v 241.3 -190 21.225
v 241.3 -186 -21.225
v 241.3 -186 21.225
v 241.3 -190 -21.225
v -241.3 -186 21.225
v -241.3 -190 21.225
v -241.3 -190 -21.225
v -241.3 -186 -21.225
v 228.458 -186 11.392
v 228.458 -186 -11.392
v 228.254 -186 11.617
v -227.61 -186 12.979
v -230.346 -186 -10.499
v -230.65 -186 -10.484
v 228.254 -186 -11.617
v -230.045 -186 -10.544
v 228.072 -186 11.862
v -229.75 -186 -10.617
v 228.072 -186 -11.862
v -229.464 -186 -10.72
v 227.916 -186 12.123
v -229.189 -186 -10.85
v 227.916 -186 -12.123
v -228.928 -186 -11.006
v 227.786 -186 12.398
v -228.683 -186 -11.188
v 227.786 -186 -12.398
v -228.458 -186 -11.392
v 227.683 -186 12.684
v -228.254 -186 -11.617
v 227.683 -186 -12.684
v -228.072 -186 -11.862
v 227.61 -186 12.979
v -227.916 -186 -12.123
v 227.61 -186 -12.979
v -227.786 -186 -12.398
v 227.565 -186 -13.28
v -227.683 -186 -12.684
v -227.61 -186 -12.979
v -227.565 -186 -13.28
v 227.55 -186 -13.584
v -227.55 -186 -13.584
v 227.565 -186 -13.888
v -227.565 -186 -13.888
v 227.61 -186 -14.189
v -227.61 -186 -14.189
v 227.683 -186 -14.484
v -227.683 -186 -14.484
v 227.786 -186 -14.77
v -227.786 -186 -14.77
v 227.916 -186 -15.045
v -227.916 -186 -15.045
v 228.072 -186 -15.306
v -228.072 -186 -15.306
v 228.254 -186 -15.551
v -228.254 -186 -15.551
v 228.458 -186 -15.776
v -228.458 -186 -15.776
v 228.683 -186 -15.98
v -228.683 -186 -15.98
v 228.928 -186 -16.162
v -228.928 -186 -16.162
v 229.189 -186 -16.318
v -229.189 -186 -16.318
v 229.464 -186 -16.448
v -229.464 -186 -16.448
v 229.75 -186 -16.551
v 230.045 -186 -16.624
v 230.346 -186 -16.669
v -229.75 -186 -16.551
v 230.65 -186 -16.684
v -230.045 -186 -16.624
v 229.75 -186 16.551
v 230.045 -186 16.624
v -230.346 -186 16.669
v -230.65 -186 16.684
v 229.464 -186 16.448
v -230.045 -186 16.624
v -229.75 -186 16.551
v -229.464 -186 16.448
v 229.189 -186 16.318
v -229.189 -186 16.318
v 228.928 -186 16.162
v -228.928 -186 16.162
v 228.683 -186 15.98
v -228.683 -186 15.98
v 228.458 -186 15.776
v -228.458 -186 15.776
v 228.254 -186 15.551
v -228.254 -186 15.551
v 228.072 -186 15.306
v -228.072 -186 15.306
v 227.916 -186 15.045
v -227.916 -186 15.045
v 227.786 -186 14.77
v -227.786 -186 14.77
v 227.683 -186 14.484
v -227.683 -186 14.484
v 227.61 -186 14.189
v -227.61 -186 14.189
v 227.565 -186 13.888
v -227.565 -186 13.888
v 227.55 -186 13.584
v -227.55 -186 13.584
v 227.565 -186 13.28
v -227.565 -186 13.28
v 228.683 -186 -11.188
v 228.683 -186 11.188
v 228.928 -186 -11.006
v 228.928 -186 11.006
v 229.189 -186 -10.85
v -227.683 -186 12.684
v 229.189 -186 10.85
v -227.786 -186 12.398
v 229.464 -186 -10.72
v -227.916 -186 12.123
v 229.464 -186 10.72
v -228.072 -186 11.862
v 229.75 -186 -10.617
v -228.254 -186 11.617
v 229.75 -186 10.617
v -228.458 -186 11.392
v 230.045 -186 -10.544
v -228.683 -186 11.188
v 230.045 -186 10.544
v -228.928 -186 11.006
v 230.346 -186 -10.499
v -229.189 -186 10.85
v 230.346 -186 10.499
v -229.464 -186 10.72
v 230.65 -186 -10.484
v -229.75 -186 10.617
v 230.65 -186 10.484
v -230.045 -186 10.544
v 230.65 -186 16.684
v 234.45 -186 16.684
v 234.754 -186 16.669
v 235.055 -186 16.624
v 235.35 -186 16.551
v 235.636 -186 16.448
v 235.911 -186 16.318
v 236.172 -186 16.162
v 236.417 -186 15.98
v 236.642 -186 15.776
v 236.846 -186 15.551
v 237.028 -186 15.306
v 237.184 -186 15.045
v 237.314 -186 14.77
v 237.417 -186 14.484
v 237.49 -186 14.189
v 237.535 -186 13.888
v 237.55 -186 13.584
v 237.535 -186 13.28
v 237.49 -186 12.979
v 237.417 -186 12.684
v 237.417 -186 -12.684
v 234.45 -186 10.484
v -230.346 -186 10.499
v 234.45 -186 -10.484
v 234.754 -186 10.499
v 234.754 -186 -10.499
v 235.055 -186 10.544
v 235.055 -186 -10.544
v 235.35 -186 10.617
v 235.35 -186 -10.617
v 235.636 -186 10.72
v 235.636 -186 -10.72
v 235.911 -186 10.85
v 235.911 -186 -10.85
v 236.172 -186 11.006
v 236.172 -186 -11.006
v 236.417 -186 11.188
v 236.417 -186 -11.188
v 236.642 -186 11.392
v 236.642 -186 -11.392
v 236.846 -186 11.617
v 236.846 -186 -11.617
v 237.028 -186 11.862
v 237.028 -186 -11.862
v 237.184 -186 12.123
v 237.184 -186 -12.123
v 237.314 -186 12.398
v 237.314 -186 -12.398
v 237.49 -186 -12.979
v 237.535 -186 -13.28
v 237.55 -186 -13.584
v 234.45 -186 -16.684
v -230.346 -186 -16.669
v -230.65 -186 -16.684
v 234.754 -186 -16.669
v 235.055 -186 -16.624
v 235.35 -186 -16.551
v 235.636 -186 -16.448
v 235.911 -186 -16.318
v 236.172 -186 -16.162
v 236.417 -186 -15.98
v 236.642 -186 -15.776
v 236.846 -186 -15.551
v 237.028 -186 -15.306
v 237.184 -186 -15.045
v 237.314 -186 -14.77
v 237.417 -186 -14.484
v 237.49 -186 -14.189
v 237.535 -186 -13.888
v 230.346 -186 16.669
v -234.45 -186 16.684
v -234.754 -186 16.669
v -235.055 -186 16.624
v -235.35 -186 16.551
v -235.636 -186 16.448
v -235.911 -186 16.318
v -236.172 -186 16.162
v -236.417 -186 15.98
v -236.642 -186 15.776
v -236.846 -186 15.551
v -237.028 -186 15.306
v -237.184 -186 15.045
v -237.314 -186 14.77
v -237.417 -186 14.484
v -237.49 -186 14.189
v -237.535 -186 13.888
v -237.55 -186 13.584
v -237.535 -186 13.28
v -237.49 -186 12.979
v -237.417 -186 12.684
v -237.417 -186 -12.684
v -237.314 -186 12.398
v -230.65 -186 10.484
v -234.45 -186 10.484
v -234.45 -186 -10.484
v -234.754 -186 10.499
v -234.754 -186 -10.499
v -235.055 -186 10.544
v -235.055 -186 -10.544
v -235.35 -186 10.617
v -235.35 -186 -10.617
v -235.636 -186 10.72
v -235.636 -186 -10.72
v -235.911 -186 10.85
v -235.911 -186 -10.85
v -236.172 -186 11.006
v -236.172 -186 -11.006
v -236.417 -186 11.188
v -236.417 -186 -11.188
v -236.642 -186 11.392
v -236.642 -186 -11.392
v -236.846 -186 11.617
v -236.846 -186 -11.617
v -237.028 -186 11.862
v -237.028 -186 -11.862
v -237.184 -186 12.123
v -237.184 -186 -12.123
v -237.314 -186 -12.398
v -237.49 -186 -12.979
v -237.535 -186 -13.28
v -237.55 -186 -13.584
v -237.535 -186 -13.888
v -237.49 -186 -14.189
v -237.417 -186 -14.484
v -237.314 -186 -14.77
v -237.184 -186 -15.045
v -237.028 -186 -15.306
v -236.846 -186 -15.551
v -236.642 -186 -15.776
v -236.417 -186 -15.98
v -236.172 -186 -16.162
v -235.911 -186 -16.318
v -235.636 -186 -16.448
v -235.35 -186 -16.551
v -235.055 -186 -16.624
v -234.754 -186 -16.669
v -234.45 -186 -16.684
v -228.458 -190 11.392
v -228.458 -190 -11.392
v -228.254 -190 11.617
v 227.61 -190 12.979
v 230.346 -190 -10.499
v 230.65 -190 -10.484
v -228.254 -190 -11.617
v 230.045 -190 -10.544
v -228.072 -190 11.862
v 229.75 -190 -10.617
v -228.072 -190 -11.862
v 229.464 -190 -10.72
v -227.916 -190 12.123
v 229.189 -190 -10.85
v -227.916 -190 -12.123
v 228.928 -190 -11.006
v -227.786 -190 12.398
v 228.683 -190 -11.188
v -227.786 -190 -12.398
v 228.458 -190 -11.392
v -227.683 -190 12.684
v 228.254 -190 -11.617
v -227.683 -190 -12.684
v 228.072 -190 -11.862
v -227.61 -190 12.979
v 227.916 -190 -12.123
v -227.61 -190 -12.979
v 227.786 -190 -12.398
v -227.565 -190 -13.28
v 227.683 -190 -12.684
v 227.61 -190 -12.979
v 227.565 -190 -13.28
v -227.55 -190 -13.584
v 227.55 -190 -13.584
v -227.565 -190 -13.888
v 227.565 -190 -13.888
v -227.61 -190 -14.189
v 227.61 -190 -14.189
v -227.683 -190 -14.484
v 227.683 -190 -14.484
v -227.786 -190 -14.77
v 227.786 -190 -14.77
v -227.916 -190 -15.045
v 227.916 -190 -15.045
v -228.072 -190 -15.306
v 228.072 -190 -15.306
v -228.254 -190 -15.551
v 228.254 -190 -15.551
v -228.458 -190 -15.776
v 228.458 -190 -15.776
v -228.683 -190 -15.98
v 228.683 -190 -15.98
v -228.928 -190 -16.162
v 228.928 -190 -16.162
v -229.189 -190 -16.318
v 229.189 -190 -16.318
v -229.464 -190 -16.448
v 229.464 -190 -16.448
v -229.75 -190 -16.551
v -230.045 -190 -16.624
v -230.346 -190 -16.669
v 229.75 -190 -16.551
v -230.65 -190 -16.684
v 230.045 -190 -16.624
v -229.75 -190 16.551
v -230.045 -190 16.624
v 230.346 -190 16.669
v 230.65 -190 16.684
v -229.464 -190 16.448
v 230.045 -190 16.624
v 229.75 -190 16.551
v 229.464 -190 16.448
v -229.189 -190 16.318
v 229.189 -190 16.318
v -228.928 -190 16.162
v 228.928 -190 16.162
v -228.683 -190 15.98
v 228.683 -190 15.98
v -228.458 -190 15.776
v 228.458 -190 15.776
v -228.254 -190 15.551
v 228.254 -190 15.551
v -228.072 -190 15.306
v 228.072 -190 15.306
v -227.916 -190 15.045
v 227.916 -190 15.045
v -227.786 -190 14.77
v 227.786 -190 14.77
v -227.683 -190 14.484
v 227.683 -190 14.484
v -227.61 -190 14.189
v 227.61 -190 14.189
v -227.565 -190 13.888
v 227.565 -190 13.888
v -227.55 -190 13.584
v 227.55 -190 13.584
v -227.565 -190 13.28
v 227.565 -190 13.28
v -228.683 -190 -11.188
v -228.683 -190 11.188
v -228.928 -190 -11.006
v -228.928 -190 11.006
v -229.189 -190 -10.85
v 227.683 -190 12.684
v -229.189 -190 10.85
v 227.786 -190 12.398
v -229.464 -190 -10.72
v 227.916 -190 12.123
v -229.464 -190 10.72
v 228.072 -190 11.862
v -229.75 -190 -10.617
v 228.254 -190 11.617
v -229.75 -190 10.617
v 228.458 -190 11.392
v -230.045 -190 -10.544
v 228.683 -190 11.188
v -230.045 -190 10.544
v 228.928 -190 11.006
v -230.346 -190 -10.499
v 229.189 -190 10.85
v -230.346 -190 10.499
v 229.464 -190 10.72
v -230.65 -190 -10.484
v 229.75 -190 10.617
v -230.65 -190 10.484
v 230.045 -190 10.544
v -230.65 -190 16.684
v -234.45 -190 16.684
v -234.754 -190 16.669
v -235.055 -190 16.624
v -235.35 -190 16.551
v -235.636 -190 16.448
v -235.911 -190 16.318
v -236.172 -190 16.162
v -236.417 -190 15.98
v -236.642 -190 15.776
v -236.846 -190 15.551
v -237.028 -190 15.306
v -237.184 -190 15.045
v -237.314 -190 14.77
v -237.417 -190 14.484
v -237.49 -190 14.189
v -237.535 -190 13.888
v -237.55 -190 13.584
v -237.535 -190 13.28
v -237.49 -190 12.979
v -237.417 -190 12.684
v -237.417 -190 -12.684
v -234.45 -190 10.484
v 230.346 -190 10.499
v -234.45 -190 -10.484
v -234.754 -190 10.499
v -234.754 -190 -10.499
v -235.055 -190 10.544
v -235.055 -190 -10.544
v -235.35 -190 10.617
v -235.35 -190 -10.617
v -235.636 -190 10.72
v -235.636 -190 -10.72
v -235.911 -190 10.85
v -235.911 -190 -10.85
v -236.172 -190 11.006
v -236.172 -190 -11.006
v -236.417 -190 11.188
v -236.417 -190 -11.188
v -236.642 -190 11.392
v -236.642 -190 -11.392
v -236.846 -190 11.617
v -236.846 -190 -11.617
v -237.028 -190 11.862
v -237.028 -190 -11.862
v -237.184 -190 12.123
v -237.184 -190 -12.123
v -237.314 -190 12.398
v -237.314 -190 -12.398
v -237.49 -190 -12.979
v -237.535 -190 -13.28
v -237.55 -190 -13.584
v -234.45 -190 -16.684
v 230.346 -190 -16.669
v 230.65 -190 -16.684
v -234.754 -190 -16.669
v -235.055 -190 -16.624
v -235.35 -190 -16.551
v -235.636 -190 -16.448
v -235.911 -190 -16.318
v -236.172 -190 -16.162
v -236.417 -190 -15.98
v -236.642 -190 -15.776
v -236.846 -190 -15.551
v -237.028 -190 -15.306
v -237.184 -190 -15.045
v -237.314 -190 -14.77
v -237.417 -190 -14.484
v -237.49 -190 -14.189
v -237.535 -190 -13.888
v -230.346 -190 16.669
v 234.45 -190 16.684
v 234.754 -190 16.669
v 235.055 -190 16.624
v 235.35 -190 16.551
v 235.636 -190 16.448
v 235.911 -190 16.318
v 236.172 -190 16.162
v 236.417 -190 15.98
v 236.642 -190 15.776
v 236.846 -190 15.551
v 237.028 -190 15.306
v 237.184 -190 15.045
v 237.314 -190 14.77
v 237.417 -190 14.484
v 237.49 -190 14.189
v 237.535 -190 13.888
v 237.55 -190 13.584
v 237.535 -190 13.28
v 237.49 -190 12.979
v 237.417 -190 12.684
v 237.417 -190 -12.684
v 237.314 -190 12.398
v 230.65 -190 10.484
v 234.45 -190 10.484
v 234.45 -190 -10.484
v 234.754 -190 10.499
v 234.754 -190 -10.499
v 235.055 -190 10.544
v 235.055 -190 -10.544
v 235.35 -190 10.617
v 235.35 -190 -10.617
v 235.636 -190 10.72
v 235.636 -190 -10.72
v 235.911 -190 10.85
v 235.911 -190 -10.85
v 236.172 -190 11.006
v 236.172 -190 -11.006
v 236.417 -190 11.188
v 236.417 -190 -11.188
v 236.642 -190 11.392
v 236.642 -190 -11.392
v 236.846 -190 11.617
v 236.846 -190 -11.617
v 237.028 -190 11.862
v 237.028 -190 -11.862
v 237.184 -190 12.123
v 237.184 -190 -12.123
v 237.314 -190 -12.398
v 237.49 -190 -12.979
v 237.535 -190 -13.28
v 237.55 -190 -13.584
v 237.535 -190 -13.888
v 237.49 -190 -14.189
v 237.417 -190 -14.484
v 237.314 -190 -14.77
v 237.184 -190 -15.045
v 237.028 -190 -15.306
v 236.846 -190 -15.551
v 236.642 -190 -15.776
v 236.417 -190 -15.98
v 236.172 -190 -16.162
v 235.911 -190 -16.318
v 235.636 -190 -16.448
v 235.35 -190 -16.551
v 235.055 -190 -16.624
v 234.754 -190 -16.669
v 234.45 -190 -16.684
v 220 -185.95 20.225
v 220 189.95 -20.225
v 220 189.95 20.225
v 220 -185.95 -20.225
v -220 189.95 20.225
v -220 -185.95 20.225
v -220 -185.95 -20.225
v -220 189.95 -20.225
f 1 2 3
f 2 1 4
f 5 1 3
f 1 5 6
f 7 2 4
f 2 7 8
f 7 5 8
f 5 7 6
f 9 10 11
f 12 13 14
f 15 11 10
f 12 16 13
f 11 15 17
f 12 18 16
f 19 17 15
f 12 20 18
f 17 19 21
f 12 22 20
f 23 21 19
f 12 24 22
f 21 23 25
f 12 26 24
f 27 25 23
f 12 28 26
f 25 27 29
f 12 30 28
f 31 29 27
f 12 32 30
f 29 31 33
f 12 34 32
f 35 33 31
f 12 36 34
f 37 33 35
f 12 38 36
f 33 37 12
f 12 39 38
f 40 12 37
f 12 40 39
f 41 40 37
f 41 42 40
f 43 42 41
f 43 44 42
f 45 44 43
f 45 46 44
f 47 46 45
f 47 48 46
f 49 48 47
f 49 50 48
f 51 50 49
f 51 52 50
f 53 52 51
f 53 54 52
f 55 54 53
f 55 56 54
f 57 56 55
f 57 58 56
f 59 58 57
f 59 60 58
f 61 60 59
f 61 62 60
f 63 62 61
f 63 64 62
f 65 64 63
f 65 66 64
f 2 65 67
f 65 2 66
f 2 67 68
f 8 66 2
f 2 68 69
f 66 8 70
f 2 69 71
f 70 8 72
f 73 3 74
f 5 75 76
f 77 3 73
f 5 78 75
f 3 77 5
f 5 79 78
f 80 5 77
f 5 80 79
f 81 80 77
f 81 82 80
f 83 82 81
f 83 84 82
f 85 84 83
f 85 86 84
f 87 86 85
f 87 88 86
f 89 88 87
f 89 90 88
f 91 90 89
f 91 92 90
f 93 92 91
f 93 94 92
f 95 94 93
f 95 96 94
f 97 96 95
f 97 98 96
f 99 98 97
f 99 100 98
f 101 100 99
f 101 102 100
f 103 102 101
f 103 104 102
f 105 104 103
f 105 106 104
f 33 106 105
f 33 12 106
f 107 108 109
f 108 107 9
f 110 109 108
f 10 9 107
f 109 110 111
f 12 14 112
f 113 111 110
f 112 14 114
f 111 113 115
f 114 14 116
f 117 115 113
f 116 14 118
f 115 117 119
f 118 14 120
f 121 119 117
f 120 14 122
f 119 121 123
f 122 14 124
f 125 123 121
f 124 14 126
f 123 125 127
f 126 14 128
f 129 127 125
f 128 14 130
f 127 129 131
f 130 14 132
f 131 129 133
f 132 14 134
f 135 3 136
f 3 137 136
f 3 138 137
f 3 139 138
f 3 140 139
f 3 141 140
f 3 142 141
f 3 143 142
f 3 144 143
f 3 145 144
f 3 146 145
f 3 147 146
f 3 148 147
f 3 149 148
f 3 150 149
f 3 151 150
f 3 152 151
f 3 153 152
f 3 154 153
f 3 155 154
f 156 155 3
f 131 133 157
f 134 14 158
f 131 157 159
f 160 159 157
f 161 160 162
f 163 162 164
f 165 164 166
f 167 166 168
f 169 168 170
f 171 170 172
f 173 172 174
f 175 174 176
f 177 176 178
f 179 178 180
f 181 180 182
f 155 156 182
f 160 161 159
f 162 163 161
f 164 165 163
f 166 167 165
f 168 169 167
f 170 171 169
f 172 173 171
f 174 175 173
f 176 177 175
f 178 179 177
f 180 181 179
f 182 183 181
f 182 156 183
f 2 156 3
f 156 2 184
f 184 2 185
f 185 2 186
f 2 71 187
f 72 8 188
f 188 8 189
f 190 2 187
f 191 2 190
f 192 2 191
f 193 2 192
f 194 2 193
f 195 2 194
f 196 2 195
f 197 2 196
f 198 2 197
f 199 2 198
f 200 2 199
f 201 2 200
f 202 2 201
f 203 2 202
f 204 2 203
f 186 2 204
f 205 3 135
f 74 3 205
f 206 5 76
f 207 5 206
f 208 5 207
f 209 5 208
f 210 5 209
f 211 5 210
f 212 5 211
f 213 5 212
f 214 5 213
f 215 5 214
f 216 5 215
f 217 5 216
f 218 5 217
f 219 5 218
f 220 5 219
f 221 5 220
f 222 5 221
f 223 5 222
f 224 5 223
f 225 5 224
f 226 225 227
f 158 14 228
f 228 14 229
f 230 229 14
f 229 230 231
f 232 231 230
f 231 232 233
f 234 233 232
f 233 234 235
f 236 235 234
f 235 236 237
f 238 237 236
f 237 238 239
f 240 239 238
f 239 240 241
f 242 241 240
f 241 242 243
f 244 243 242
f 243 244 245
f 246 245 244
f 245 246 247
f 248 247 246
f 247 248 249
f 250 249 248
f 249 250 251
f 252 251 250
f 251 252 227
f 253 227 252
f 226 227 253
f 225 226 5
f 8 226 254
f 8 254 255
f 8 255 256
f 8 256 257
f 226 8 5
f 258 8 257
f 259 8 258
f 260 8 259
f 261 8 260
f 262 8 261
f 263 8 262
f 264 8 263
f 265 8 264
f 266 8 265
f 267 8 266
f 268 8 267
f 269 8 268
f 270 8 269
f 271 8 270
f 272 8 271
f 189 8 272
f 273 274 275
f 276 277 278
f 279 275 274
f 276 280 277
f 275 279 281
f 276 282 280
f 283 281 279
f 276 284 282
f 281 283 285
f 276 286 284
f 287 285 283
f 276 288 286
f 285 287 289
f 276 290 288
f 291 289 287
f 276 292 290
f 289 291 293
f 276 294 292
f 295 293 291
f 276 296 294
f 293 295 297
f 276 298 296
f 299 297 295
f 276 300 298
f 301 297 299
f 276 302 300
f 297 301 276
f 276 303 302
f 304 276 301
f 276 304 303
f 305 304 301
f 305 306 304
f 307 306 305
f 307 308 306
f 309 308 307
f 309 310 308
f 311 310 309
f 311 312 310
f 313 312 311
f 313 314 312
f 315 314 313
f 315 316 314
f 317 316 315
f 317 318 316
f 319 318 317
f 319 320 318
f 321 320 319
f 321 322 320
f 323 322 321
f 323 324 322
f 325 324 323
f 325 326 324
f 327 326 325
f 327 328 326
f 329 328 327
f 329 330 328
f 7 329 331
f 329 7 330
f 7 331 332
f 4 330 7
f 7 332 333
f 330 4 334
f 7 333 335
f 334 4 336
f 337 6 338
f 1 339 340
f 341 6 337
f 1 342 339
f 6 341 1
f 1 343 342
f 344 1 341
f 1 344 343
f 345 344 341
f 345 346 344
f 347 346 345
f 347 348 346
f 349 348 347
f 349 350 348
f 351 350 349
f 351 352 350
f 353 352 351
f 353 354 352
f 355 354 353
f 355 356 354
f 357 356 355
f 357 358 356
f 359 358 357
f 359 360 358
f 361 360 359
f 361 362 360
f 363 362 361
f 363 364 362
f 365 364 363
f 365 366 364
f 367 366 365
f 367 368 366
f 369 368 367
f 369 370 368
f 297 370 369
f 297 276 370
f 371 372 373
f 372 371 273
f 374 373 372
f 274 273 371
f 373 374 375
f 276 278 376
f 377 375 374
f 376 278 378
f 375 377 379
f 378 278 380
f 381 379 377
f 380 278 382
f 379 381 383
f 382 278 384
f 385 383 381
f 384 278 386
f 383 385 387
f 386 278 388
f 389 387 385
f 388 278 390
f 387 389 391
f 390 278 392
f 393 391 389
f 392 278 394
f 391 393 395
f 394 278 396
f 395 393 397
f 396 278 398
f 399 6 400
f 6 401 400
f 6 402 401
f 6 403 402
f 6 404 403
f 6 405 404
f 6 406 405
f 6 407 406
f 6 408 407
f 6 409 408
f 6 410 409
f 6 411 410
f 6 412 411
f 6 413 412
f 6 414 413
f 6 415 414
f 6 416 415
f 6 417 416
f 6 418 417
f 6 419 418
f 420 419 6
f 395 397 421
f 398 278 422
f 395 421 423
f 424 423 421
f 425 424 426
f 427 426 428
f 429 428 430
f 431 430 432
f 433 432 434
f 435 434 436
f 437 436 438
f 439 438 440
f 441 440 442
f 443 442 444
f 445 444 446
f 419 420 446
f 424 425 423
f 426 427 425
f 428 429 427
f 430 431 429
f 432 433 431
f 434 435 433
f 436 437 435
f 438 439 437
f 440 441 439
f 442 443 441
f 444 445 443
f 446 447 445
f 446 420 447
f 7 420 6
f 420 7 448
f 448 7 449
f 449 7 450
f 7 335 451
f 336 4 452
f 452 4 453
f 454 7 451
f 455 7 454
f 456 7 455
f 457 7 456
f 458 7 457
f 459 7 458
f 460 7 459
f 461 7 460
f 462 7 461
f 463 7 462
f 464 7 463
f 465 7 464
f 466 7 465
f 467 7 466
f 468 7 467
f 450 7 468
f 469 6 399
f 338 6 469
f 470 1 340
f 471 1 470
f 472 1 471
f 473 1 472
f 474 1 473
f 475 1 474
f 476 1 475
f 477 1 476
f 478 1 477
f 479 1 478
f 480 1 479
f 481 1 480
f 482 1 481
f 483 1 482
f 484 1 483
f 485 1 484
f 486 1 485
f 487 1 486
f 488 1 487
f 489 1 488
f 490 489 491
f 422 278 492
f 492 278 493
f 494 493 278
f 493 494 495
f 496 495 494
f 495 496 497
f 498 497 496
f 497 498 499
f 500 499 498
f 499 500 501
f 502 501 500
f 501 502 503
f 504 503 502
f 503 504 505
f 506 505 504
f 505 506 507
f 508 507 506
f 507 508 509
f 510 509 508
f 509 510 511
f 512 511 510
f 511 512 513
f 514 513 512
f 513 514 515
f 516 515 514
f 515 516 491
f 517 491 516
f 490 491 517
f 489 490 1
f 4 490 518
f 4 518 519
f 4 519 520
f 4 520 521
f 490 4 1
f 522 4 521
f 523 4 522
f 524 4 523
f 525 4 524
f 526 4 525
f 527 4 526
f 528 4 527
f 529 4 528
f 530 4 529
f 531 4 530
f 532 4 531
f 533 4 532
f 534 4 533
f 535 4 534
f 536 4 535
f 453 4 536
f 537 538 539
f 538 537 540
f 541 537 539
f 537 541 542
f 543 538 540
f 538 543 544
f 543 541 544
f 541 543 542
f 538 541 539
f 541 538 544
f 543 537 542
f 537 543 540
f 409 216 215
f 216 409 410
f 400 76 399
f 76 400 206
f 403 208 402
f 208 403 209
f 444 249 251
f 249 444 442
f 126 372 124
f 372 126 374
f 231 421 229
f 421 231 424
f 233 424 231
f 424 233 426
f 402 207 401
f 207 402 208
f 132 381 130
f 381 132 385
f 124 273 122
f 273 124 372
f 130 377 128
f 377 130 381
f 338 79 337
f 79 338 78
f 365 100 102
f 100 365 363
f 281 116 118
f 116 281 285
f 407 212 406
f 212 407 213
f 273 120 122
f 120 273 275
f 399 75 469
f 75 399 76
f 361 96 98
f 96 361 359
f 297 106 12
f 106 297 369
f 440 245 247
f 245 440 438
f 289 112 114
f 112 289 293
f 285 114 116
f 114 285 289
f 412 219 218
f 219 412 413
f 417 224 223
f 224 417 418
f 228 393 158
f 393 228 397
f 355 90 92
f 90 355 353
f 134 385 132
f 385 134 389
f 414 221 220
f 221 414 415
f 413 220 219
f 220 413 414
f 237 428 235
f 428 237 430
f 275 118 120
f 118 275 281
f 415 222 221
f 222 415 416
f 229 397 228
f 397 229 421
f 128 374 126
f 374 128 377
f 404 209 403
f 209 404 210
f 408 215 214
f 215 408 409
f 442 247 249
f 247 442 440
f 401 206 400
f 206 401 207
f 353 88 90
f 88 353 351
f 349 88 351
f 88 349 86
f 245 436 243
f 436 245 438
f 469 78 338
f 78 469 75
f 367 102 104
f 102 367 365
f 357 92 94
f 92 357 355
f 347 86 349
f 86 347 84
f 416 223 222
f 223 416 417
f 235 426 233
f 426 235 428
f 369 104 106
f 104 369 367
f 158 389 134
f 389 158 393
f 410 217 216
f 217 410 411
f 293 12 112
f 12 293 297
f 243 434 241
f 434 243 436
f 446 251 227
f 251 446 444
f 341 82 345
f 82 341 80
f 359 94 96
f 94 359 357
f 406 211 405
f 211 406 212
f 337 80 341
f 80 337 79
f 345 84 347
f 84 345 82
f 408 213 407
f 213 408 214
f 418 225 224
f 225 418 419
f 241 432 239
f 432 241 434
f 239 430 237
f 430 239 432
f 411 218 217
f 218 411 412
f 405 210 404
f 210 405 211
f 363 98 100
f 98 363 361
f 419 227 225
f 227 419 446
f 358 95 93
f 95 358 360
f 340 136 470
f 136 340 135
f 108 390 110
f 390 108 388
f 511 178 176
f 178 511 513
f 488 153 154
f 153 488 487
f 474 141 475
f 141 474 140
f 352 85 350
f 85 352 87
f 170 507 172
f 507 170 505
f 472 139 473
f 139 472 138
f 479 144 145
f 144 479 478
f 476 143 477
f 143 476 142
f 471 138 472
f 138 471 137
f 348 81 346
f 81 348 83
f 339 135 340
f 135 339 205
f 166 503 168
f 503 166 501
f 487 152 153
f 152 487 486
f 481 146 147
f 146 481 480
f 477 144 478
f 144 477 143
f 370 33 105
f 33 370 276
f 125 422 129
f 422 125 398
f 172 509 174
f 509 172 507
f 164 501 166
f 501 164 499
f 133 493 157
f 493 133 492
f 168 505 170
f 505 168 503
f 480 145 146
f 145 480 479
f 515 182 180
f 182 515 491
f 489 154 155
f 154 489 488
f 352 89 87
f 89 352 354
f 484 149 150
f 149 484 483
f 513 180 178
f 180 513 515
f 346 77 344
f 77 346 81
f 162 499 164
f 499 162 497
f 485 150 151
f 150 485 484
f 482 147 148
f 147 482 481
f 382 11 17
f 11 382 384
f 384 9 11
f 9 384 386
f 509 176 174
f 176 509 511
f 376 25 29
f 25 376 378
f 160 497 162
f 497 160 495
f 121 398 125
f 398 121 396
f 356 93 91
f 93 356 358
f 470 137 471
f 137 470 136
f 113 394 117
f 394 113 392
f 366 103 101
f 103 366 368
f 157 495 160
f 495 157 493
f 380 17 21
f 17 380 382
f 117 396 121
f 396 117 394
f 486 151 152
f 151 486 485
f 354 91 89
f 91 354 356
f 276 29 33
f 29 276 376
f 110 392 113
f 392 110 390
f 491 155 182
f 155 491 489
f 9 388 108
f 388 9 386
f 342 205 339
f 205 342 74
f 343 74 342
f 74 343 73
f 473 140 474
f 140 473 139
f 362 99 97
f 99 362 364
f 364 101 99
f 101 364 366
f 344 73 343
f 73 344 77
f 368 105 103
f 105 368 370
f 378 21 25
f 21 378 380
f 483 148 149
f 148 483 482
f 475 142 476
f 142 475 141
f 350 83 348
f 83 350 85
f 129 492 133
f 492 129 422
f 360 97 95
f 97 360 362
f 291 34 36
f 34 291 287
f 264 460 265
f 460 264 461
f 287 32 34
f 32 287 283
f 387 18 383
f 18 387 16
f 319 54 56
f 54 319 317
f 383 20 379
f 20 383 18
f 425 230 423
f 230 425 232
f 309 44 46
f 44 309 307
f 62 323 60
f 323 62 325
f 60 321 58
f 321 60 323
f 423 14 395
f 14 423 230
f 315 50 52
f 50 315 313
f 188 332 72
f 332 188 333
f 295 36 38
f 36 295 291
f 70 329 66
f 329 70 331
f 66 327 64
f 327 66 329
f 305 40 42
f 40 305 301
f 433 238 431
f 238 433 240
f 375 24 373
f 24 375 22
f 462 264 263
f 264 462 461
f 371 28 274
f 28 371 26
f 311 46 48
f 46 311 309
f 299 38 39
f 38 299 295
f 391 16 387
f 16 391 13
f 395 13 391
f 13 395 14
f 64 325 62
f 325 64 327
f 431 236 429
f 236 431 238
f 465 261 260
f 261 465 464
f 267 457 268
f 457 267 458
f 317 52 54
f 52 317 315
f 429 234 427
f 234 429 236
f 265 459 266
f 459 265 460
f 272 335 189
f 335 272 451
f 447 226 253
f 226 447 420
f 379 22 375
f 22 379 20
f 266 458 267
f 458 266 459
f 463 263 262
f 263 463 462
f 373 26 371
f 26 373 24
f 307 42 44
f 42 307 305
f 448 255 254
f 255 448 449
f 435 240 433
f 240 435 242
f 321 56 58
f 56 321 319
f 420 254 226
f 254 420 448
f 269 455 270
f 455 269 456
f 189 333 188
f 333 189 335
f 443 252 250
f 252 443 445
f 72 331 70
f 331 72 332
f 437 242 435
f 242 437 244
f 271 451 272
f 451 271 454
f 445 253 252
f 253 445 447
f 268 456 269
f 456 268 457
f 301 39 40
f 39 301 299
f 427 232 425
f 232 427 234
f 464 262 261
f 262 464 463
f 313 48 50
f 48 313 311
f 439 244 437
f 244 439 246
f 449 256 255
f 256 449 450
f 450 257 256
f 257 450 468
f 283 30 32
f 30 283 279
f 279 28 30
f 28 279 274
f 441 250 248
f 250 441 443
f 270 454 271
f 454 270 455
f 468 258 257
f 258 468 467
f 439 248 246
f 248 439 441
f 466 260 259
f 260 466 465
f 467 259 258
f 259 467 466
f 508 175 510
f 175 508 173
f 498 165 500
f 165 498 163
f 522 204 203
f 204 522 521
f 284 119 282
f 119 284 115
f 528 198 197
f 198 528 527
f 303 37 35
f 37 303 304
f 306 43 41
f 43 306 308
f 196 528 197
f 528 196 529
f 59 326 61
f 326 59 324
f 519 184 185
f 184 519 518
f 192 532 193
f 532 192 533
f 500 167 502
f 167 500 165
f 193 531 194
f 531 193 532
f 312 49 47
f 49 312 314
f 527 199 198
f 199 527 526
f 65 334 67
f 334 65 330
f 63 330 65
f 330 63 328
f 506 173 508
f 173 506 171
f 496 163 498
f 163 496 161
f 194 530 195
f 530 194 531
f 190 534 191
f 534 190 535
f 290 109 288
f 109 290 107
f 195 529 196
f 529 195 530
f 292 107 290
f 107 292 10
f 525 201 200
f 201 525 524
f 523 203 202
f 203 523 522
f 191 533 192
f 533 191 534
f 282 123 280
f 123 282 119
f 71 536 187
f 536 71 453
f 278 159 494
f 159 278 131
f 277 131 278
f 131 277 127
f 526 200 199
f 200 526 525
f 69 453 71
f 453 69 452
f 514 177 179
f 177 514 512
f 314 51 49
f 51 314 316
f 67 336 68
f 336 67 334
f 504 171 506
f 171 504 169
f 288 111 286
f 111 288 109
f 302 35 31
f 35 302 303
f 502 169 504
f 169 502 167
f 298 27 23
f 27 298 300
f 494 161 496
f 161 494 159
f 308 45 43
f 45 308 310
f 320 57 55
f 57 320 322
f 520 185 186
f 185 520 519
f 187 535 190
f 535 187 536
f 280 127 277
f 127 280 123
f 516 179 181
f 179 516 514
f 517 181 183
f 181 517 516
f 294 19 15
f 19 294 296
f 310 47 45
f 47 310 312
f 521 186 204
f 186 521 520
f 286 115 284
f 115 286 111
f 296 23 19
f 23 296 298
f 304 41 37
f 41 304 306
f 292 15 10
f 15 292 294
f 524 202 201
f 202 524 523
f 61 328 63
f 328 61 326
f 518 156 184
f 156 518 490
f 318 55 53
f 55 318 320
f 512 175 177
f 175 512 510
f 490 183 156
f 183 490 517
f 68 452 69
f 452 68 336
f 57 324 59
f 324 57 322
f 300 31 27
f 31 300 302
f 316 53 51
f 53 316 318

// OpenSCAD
// ============================================================================
// Atom Lithography Machine — Parametric OpenSCAD Module (S7.4-02)
// ============================================================================
// part_id           : S7.4-02
// parent_bom_id     : S7.4
// subsystem         : S7
// part_name         : White Rabbit / sub-ns donanim tetikleme (trigger) fan-out modulu
// material          : Steel
// temp_stage        : 300 K (kabin)
// vacuum_grade      : Atmosfer
// tolerance         : <200 ps
// computed_mass_kg  : 5.20000
// envelope_mm       : 482.600 x 403.300 x 42.450
// design_maturity   : M0_M1_DETAILED_CAD_DESIGN_ONLY
// no_lab_measurement: true
// iec61508_certified: false
// semi_s2_certified : false
// Units: millimeters (mm)
// ============================================================================

$fn = 64;

// Nominal bounding envelope parameters (mm)
bbox_x = 482.6000;
bbox_y = 403.3000;
bbox_z = 42.4500;

// Part-specific parametric dimensions
u_start = 37;
u_count = 1;
sfp_ports = 18;
depth_mm = 380.0;

// Interface / port parameters (mm)

module part_S7_4_02() {
  difference() {
    union() {
      // 19-inch EIA-310 front faceplate
      translate([0.000, -188.000, 0.000]) cube([482.600, 4.000, 42.450], center=true);
      // Main rack chassis enclosure
      translate([0.000, 2.000, 0.000]) cube([440.000, 375.900, 40.450], center=true);
    }
    // EIA-310 rack ear mounting slot (top-left)
    translate([-232.550, -188.000, 13.584]) rotate([90.000, 0.000, 0.000]) {
      hull() {
        translate([-1.900, 0, 0]) cylinder(d=6.200, h=8.000, center=true);
        translate([1.900, 0, 0]) cylinder(d=6.200, h=8.000, center=true);
      }
    }
    // EIA-310 rack ear mounting slot (top-right)
    translate([232.550, -188.000, 13.584]) rotate([90.000, 0.000, 0.000]) {
      hull() {
        translate([-1.900, 0, 0]) cylinder(d=6.200, h=8.000, center=true);
        translate([1.900, 0, 0]) cylinder(d=6.200, h=8.000, center=true);
      }
    }
    // EIA-310 rack ear mounting slot (bottom-left)
    translate([-232.550, -188.000, -13.584]) rotate([90.000, 0.000, 0.000]) {
      hull() {
        translate([-1.900, 0, 0]) cylinder(d=6.200, h=8.000, center=true);
        translate([1.900, 0, 0]) cylinder(d=6.200, h=8.000, center=true);
      }
    }
    // EIA-310 rack ear mounting slot (bottom-right)
    translate([232.550, -188.000, -13.584]) rotate([90.000, 0.000, 0.000]) {
      hull() {
        translate([-1.900, 0, 0]) cylinder(d=6.200, h=8.000, center=true);
        translate([1.900, 0, 0]) cylinder(d=6.200, h=8.000, center=true);
      }
    }
  }
}

// World assembly mounting transform (global machine frame, mm / deg):
// translate([1480.000, -248.000, 1712.425]) rotate([0.000, 0.000, 0.000]) part_S7_4_02();

part_S7_4_02();
